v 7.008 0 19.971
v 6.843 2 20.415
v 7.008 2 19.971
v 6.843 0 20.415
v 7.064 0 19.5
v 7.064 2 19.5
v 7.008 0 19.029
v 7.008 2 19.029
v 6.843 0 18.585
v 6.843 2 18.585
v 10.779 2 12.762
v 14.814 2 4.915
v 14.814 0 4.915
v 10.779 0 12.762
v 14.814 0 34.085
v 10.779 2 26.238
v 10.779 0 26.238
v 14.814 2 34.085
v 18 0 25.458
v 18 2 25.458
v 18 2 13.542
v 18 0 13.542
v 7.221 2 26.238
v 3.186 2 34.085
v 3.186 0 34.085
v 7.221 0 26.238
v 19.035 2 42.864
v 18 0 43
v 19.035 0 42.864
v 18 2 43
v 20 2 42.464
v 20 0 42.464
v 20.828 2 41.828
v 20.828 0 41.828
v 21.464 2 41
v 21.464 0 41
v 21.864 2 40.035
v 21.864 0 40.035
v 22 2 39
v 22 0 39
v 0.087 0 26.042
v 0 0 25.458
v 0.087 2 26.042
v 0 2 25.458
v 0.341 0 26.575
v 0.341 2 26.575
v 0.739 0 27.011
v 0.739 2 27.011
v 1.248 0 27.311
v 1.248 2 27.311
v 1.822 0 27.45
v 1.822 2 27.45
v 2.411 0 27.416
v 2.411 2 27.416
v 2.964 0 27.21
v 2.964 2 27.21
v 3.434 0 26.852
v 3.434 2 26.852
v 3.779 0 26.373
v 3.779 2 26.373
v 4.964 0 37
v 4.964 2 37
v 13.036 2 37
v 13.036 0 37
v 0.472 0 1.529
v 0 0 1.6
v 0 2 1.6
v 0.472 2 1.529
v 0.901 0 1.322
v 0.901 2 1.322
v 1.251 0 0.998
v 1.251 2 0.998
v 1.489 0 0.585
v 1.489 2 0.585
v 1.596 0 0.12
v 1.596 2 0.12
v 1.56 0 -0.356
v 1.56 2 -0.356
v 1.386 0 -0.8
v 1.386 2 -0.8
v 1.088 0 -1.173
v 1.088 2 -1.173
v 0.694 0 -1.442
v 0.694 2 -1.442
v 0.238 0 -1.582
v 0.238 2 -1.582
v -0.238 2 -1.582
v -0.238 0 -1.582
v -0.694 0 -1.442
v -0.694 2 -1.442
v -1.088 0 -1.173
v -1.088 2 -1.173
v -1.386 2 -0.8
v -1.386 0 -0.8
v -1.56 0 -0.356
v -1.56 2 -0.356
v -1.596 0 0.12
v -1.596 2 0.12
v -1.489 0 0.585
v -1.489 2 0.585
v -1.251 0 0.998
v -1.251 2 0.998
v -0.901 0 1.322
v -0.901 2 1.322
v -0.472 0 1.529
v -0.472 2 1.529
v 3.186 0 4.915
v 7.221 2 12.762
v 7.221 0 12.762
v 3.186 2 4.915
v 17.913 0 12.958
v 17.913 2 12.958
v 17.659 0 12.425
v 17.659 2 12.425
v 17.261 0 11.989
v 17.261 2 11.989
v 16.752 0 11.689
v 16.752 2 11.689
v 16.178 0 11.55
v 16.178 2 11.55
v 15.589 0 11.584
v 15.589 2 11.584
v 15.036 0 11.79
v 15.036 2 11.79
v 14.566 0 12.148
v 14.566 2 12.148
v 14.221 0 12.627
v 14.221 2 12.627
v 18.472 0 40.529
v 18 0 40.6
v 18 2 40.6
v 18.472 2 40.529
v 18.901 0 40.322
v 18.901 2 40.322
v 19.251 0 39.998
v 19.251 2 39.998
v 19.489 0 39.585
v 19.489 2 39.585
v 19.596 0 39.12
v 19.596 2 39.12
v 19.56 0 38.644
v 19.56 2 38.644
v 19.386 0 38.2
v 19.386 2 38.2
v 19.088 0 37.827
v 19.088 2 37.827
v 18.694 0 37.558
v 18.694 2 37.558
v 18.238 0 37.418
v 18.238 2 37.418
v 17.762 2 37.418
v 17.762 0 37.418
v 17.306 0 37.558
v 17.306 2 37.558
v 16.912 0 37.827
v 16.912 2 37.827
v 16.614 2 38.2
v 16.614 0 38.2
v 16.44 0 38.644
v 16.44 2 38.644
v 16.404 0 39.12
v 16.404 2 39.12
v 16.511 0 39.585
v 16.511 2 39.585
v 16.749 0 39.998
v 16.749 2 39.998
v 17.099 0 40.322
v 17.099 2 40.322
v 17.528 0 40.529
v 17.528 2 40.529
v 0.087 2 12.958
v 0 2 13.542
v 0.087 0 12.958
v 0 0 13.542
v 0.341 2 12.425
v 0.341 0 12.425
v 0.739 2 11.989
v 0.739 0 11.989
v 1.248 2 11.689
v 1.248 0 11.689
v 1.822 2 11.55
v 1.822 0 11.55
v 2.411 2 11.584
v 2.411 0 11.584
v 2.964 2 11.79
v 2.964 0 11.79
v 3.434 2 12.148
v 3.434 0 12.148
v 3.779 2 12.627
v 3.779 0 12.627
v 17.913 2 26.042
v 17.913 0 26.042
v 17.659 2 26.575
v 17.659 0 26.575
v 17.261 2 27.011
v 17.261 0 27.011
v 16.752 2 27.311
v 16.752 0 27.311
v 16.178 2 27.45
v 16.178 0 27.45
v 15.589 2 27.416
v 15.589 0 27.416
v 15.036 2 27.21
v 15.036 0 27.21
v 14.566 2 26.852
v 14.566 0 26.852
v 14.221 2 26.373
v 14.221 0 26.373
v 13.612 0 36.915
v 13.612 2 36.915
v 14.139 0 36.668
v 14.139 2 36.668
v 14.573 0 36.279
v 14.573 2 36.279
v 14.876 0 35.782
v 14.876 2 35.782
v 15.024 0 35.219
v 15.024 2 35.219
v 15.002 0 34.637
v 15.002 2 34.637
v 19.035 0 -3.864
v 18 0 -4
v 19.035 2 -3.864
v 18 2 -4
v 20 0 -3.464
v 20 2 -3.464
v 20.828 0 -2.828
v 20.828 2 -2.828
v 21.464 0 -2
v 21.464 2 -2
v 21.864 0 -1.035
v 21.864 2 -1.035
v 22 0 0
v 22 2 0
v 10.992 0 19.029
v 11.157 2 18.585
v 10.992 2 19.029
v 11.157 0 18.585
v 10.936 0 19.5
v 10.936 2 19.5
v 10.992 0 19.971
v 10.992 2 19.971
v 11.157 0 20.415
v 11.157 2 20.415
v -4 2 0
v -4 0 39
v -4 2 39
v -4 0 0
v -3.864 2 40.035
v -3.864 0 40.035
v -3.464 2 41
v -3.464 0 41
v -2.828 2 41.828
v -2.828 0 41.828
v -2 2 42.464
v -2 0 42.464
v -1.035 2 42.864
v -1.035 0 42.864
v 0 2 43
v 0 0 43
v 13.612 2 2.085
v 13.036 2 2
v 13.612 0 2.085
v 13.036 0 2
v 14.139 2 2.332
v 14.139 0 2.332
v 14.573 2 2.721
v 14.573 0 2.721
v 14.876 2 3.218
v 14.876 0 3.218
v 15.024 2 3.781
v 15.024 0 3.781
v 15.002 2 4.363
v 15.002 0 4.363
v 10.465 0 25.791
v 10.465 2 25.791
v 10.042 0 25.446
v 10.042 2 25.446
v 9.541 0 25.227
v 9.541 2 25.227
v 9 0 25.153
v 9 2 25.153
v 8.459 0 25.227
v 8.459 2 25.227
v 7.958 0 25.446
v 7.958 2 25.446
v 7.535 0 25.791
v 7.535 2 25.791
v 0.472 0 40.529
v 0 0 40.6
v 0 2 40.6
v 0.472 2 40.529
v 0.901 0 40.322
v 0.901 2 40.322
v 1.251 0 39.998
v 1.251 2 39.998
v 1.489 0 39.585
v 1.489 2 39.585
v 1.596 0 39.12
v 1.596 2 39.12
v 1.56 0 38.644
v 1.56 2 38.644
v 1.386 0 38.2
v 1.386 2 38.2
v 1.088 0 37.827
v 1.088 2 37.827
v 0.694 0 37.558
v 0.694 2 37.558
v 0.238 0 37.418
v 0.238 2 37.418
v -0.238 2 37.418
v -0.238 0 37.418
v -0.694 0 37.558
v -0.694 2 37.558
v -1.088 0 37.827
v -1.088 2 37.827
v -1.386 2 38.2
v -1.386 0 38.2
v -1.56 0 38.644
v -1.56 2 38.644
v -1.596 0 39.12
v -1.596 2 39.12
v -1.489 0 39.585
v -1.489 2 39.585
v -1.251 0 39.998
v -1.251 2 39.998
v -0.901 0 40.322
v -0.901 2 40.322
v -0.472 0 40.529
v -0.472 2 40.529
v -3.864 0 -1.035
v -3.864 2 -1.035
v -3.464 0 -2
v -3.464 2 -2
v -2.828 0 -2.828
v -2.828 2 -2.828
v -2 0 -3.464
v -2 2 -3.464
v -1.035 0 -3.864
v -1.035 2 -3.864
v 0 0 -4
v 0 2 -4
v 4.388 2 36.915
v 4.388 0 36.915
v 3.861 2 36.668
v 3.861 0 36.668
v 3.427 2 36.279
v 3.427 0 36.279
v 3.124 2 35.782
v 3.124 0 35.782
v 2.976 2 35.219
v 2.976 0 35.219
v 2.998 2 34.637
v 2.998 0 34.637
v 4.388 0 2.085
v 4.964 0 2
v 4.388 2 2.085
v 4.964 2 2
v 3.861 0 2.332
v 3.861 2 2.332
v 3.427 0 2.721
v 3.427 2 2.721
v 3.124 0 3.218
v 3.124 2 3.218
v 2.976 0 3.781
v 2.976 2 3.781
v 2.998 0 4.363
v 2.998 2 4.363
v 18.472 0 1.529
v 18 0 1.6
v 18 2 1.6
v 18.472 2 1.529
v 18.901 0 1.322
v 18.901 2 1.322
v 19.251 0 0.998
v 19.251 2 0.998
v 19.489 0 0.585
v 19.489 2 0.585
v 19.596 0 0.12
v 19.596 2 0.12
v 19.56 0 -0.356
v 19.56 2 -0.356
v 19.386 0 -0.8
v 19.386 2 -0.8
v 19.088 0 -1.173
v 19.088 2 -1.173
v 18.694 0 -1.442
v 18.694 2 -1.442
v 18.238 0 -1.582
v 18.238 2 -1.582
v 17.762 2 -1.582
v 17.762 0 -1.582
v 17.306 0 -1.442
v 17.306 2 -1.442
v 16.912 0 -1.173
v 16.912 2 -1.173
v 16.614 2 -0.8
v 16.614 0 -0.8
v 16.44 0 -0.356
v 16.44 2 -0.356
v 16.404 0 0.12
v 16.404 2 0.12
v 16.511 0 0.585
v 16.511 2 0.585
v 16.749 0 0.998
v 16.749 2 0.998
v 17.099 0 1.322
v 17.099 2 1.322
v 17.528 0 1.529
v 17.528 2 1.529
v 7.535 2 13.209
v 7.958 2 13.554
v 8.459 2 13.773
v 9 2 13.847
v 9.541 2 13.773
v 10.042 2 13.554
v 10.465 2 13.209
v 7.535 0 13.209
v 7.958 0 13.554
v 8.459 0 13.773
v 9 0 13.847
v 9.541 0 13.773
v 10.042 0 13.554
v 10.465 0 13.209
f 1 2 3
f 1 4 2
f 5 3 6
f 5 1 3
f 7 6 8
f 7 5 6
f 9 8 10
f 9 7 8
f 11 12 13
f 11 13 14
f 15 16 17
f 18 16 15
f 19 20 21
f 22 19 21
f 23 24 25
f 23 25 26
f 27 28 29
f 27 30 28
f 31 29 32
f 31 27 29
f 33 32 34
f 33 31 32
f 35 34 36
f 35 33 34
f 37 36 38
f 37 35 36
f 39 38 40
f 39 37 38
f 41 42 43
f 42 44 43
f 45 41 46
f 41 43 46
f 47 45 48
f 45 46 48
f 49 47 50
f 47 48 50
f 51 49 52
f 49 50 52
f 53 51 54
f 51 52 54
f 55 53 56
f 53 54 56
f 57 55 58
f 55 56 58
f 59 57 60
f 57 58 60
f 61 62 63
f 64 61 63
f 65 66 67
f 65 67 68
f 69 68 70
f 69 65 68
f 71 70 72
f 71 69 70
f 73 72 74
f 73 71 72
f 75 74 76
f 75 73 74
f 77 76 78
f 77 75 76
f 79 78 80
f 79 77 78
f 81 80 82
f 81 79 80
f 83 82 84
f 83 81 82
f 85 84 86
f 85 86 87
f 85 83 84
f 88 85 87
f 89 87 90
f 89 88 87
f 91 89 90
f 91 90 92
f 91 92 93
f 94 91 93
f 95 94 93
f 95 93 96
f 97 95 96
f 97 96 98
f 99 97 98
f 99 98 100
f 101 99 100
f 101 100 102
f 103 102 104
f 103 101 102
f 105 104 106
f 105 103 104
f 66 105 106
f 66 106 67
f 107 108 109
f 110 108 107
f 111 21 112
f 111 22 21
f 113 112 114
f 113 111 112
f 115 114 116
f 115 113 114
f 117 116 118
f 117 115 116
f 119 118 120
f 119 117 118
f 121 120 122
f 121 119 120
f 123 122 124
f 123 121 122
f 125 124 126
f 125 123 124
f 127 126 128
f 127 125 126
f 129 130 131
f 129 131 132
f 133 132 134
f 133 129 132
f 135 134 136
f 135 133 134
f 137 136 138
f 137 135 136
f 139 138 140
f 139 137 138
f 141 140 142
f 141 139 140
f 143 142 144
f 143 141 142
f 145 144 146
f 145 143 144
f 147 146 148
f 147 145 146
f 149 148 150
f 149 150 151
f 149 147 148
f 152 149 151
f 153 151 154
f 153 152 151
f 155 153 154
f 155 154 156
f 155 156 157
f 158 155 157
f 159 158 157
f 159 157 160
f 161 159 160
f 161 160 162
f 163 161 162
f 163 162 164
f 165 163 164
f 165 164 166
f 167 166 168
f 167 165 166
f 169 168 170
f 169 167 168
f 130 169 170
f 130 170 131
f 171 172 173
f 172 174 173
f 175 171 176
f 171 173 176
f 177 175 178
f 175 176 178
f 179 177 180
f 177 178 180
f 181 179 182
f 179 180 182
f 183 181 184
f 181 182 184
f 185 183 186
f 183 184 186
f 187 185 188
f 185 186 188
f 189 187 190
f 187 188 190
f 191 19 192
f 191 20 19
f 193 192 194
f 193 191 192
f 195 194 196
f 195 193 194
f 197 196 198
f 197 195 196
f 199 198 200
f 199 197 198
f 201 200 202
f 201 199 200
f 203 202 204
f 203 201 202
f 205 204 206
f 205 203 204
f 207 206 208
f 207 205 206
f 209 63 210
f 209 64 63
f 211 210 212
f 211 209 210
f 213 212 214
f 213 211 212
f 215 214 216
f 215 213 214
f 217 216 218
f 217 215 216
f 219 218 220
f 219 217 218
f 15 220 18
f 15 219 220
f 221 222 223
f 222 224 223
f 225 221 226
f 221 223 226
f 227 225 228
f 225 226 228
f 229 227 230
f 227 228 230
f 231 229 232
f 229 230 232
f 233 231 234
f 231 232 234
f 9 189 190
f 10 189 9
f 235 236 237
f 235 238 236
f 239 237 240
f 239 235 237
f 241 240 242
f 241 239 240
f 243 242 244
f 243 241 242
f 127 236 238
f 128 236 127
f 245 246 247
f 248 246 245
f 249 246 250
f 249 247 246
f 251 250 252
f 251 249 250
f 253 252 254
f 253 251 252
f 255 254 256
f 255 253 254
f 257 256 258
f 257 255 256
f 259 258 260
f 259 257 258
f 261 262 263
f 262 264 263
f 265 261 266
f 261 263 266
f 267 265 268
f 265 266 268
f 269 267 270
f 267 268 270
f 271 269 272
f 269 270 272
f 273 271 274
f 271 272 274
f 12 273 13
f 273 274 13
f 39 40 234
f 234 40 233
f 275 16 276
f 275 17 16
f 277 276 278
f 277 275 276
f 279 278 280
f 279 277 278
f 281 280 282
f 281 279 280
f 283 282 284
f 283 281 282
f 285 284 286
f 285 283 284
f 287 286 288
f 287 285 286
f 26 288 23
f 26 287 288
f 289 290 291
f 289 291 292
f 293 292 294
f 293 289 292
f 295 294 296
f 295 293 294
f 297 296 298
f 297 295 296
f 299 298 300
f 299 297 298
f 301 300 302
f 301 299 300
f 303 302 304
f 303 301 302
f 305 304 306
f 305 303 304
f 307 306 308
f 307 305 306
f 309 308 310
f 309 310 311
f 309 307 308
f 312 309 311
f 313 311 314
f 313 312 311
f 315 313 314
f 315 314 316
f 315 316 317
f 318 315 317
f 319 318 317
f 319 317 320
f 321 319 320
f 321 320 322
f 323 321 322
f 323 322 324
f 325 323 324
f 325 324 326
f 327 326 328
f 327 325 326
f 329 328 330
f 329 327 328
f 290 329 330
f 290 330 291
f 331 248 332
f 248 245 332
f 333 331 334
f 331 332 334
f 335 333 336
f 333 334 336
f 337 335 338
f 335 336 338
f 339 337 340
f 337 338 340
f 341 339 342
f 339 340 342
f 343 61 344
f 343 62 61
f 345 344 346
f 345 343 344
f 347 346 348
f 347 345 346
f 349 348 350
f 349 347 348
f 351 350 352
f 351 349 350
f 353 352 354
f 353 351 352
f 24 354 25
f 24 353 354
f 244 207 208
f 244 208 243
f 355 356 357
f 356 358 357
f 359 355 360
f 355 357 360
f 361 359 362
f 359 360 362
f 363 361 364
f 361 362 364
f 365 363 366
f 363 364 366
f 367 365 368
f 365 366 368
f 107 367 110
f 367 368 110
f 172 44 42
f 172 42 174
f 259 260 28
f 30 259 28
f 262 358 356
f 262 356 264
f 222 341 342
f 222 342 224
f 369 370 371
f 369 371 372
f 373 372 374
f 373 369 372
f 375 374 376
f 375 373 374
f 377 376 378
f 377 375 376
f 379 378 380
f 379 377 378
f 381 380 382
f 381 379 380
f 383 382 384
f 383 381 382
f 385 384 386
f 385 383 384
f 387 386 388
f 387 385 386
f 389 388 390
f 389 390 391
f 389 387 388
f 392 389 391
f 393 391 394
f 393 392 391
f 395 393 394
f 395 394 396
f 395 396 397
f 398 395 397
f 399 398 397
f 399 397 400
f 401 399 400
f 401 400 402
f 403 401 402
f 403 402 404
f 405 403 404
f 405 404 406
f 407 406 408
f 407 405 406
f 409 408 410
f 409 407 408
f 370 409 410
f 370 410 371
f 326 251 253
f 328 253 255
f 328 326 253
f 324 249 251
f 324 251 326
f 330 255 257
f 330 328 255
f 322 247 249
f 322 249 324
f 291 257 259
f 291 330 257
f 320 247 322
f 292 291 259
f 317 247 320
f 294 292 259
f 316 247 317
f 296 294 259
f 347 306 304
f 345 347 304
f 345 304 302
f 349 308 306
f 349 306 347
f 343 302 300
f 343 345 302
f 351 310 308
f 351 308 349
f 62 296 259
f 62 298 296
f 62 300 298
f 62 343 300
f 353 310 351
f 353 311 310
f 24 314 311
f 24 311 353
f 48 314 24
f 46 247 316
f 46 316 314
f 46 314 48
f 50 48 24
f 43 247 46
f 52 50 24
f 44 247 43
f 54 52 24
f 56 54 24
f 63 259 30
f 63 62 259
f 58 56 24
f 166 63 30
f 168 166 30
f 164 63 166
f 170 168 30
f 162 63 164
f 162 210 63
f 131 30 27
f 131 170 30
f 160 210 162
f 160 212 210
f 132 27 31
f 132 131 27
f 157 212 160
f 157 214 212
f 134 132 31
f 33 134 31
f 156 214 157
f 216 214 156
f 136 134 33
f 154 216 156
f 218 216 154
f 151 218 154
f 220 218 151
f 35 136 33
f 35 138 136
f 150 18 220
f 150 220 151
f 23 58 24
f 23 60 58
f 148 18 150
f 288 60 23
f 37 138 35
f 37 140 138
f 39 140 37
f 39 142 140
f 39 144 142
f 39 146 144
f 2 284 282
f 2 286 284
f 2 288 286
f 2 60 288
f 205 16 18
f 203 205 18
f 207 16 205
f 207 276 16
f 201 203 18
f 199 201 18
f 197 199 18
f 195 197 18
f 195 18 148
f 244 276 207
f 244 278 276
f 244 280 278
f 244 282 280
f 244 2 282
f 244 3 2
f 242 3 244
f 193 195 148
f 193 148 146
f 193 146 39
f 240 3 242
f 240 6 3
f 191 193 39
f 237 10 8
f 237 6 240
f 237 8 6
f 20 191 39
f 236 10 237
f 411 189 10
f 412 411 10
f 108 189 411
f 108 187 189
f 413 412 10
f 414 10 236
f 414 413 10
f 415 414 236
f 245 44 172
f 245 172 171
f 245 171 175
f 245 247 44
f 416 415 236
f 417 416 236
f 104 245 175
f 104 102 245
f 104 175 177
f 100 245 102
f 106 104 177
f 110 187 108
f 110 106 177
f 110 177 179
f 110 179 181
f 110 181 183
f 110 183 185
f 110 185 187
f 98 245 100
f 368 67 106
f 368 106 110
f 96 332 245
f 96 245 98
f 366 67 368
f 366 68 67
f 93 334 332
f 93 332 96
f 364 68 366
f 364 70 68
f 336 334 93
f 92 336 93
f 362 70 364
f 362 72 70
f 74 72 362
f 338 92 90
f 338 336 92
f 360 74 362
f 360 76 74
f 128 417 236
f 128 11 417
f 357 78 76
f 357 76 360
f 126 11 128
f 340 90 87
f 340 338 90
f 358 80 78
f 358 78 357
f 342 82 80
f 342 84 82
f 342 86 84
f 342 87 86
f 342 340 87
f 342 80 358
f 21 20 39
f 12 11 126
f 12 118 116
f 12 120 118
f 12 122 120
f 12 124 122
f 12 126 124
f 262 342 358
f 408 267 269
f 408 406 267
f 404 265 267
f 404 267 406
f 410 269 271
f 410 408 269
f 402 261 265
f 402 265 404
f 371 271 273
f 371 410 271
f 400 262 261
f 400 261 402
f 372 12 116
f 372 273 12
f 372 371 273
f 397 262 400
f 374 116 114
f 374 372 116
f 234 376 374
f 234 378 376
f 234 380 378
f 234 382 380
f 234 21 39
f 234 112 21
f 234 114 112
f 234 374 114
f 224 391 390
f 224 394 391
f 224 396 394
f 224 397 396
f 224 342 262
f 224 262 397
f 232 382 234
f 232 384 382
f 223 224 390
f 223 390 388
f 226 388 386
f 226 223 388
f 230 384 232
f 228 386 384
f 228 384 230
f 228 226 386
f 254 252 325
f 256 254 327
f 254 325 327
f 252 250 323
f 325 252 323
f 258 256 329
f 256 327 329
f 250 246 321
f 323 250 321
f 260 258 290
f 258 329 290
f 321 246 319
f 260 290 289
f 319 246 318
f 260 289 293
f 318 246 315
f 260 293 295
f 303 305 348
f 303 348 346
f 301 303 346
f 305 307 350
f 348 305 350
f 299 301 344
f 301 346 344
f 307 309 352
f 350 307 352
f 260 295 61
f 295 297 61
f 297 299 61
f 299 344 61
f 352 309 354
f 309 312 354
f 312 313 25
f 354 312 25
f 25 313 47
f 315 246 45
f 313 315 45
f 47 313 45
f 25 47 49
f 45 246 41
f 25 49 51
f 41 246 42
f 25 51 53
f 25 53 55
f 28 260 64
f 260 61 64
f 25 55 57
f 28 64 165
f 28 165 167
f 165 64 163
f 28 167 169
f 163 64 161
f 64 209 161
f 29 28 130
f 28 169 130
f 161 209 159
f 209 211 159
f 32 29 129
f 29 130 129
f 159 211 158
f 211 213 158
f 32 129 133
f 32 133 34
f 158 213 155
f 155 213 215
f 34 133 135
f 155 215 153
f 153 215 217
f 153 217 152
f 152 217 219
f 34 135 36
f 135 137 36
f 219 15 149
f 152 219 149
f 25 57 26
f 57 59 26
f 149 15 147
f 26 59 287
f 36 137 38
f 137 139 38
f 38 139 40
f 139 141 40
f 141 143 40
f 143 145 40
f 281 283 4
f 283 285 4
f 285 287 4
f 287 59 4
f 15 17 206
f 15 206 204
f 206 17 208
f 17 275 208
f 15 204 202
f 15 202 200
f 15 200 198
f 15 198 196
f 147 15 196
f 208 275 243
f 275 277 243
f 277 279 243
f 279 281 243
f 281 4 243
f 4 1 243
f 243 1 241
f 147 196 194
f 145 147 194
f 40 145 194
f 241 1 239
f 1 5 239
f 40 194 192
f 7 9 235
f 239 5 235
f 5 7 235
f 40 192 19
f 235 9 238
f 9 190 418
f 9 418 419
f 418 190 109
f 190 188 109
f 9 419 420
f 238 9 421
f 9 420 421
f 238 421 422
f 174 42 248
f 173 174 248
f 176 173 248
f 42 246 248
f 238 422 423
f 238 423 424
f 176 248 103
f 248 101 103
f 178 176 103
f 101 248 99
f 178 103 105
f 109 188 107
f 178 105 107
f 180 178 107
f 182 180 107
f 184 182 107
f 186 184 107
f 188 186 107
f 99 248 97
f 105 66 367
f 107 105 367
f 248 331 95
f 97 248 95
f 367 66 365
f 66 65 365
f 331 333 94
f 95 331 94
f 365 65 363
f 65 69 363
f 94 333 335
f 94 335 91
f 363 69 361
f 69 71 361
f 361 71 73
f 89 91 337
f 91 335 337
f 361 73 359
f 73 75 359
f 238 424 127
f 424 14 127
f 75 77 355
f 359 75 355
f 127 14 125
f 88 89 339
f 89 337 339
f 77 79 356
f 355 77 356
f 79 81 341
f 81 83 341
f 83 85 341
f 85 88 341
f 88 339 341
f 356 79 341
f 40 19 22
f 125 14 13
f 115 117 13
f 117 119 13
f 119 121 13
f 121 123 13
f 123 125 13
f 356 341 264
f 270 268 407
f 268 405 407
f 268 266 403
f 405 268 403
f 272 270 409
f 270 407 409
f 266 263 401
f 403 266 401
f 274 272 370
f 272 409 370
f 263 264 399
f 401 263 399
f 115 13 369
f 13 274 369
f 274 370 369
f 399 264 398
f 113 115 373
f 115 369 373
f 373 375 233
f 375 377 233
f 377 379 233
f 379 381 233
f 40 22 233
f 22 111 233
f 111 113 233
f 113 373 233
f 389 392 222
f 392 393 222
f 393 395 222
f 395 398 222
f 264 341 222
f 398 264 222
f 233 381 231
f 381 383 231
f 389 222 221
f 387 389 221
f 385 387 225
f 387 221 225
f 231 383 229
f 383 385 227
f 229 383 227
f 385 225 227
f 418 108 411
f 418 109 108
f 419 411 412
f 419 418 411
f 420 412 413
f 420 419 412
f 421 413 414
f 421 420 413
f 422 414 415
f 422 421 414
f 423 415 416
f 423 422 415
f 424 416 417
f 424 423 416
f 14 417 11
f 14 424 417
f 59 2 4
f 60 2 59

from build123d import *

# Parameters (mm, degrees)
SKETCH1_W           = 26
SKETCH1_H           = 47
SKETCH1_R           = 1.6
BOSS_EXTRUDE1_DEPTH = 2
FILLET1_R           = 4
SKETCH2_W           = 18
SKETCH2_H           = 35
CUT_EXTRUDE1_DEPTH  = 2
EXTRUDE_THIN1_DEPTH = 2
FILLET2_R           = 2


with BuildPart() as part:
    # Sketch1 → Boss-Extrude1 (new body)
    with BuildSketch(Plane(origin=(0, 0, 0), x_dir=(1, 0, 0), z_dir=(0, 1, 0))):
        with Locations((9, -19.5)):
            Rectangle(SKETCH1_W, SKETCH1_H)
        with Locations(Location((0, -39, 0), (0, 0, 270))):
            Circle(SKETCH1_R, mode=Mode.SUBTRACT)
        with Locations(Location((18, 0, 0), (0, 0, 270))):
            Circle(SKETCH1_R, mode=Mode.SUBTRACT)
        with Locations(Location((0, 0, 0), (0, 0, 270))):
            Circle(SKETCH1_R, mode=Mode.SUBTRACT)
        with Locations(Location((18, -39, 0), (0, 0, 270))):
            Circle(SKETCH1_R, mode=Mode.SUBTRACT)
    extrude(amount=BOSS_EXTRUDE1_DEPTH)

    # Fillet1
    fillet1_edges = [part.edges().sort_by_distance(p)[0] for p in [
        (-4, 1, -4),
        (22, 1, -4),
        (22, 1, 43),
        (-4, 1, 43),
    ]]
    fillet(fillet1_edges, radius=FILLET1_R)

    # Sketch2 → Cut-Extrude1 (cut)
    with BuildSketch(Plane(origin=(0, 2, 0), x_dir=(1, 0, 0), z_dir=(0, 1, 0))):
        with Locations((9, -19.5)):
            Rectangle(SKETCH2_W, SKETCH2_H)
    extrude(amount=-CUT_EXTRUDE1_DEPTH, mode=Mode.SUBTRACT)

    # Sketch3 → Extrude-Thin1 (add)
    with BuildSketch(Plane(origin=(0, 2, 0), x_dir=(1, 0, 0), z_dir=(0, 1, 0))):
        Polygon((-1.333931703, -2.686022019), (16.666068297, -37.686022019), (19.333931703, -36.313977981), (1.333931703, -1.313977981), align=None)
        Polygon((16.666068297, -1.313977981), (-1.333931703, -36.313977981), (1.333931703, -37.686022019), (19.333931703, -2.686022019), align=None)
    extrude(amount=-EXTRUDE_THIN1_DEPTH)

    # Fillet2
    fillet2_edges = [part.edges().sort_by_distance(p)[0] for p in [
        (1.686743027, 1, 37),
        (16.313256973, 1, 37),
        (18, 1, 5.279778109),
        (18, 1, 33.720221891),
        (16.313256973, 1, 2),
        (1.686743027, 1, 2),
        (0, 1, 33.720221891),
        (0, 1, 5.279778109),
        (7.313256973, 1, 19.5),
        (9, 1, 16.220221891),
        (10.686743027, 1, 19.5),
        (9, 1, 22.779778109),
    ]]
    fillet(fillet2_edges, radius=FILLET2_R)


solid = part.part
